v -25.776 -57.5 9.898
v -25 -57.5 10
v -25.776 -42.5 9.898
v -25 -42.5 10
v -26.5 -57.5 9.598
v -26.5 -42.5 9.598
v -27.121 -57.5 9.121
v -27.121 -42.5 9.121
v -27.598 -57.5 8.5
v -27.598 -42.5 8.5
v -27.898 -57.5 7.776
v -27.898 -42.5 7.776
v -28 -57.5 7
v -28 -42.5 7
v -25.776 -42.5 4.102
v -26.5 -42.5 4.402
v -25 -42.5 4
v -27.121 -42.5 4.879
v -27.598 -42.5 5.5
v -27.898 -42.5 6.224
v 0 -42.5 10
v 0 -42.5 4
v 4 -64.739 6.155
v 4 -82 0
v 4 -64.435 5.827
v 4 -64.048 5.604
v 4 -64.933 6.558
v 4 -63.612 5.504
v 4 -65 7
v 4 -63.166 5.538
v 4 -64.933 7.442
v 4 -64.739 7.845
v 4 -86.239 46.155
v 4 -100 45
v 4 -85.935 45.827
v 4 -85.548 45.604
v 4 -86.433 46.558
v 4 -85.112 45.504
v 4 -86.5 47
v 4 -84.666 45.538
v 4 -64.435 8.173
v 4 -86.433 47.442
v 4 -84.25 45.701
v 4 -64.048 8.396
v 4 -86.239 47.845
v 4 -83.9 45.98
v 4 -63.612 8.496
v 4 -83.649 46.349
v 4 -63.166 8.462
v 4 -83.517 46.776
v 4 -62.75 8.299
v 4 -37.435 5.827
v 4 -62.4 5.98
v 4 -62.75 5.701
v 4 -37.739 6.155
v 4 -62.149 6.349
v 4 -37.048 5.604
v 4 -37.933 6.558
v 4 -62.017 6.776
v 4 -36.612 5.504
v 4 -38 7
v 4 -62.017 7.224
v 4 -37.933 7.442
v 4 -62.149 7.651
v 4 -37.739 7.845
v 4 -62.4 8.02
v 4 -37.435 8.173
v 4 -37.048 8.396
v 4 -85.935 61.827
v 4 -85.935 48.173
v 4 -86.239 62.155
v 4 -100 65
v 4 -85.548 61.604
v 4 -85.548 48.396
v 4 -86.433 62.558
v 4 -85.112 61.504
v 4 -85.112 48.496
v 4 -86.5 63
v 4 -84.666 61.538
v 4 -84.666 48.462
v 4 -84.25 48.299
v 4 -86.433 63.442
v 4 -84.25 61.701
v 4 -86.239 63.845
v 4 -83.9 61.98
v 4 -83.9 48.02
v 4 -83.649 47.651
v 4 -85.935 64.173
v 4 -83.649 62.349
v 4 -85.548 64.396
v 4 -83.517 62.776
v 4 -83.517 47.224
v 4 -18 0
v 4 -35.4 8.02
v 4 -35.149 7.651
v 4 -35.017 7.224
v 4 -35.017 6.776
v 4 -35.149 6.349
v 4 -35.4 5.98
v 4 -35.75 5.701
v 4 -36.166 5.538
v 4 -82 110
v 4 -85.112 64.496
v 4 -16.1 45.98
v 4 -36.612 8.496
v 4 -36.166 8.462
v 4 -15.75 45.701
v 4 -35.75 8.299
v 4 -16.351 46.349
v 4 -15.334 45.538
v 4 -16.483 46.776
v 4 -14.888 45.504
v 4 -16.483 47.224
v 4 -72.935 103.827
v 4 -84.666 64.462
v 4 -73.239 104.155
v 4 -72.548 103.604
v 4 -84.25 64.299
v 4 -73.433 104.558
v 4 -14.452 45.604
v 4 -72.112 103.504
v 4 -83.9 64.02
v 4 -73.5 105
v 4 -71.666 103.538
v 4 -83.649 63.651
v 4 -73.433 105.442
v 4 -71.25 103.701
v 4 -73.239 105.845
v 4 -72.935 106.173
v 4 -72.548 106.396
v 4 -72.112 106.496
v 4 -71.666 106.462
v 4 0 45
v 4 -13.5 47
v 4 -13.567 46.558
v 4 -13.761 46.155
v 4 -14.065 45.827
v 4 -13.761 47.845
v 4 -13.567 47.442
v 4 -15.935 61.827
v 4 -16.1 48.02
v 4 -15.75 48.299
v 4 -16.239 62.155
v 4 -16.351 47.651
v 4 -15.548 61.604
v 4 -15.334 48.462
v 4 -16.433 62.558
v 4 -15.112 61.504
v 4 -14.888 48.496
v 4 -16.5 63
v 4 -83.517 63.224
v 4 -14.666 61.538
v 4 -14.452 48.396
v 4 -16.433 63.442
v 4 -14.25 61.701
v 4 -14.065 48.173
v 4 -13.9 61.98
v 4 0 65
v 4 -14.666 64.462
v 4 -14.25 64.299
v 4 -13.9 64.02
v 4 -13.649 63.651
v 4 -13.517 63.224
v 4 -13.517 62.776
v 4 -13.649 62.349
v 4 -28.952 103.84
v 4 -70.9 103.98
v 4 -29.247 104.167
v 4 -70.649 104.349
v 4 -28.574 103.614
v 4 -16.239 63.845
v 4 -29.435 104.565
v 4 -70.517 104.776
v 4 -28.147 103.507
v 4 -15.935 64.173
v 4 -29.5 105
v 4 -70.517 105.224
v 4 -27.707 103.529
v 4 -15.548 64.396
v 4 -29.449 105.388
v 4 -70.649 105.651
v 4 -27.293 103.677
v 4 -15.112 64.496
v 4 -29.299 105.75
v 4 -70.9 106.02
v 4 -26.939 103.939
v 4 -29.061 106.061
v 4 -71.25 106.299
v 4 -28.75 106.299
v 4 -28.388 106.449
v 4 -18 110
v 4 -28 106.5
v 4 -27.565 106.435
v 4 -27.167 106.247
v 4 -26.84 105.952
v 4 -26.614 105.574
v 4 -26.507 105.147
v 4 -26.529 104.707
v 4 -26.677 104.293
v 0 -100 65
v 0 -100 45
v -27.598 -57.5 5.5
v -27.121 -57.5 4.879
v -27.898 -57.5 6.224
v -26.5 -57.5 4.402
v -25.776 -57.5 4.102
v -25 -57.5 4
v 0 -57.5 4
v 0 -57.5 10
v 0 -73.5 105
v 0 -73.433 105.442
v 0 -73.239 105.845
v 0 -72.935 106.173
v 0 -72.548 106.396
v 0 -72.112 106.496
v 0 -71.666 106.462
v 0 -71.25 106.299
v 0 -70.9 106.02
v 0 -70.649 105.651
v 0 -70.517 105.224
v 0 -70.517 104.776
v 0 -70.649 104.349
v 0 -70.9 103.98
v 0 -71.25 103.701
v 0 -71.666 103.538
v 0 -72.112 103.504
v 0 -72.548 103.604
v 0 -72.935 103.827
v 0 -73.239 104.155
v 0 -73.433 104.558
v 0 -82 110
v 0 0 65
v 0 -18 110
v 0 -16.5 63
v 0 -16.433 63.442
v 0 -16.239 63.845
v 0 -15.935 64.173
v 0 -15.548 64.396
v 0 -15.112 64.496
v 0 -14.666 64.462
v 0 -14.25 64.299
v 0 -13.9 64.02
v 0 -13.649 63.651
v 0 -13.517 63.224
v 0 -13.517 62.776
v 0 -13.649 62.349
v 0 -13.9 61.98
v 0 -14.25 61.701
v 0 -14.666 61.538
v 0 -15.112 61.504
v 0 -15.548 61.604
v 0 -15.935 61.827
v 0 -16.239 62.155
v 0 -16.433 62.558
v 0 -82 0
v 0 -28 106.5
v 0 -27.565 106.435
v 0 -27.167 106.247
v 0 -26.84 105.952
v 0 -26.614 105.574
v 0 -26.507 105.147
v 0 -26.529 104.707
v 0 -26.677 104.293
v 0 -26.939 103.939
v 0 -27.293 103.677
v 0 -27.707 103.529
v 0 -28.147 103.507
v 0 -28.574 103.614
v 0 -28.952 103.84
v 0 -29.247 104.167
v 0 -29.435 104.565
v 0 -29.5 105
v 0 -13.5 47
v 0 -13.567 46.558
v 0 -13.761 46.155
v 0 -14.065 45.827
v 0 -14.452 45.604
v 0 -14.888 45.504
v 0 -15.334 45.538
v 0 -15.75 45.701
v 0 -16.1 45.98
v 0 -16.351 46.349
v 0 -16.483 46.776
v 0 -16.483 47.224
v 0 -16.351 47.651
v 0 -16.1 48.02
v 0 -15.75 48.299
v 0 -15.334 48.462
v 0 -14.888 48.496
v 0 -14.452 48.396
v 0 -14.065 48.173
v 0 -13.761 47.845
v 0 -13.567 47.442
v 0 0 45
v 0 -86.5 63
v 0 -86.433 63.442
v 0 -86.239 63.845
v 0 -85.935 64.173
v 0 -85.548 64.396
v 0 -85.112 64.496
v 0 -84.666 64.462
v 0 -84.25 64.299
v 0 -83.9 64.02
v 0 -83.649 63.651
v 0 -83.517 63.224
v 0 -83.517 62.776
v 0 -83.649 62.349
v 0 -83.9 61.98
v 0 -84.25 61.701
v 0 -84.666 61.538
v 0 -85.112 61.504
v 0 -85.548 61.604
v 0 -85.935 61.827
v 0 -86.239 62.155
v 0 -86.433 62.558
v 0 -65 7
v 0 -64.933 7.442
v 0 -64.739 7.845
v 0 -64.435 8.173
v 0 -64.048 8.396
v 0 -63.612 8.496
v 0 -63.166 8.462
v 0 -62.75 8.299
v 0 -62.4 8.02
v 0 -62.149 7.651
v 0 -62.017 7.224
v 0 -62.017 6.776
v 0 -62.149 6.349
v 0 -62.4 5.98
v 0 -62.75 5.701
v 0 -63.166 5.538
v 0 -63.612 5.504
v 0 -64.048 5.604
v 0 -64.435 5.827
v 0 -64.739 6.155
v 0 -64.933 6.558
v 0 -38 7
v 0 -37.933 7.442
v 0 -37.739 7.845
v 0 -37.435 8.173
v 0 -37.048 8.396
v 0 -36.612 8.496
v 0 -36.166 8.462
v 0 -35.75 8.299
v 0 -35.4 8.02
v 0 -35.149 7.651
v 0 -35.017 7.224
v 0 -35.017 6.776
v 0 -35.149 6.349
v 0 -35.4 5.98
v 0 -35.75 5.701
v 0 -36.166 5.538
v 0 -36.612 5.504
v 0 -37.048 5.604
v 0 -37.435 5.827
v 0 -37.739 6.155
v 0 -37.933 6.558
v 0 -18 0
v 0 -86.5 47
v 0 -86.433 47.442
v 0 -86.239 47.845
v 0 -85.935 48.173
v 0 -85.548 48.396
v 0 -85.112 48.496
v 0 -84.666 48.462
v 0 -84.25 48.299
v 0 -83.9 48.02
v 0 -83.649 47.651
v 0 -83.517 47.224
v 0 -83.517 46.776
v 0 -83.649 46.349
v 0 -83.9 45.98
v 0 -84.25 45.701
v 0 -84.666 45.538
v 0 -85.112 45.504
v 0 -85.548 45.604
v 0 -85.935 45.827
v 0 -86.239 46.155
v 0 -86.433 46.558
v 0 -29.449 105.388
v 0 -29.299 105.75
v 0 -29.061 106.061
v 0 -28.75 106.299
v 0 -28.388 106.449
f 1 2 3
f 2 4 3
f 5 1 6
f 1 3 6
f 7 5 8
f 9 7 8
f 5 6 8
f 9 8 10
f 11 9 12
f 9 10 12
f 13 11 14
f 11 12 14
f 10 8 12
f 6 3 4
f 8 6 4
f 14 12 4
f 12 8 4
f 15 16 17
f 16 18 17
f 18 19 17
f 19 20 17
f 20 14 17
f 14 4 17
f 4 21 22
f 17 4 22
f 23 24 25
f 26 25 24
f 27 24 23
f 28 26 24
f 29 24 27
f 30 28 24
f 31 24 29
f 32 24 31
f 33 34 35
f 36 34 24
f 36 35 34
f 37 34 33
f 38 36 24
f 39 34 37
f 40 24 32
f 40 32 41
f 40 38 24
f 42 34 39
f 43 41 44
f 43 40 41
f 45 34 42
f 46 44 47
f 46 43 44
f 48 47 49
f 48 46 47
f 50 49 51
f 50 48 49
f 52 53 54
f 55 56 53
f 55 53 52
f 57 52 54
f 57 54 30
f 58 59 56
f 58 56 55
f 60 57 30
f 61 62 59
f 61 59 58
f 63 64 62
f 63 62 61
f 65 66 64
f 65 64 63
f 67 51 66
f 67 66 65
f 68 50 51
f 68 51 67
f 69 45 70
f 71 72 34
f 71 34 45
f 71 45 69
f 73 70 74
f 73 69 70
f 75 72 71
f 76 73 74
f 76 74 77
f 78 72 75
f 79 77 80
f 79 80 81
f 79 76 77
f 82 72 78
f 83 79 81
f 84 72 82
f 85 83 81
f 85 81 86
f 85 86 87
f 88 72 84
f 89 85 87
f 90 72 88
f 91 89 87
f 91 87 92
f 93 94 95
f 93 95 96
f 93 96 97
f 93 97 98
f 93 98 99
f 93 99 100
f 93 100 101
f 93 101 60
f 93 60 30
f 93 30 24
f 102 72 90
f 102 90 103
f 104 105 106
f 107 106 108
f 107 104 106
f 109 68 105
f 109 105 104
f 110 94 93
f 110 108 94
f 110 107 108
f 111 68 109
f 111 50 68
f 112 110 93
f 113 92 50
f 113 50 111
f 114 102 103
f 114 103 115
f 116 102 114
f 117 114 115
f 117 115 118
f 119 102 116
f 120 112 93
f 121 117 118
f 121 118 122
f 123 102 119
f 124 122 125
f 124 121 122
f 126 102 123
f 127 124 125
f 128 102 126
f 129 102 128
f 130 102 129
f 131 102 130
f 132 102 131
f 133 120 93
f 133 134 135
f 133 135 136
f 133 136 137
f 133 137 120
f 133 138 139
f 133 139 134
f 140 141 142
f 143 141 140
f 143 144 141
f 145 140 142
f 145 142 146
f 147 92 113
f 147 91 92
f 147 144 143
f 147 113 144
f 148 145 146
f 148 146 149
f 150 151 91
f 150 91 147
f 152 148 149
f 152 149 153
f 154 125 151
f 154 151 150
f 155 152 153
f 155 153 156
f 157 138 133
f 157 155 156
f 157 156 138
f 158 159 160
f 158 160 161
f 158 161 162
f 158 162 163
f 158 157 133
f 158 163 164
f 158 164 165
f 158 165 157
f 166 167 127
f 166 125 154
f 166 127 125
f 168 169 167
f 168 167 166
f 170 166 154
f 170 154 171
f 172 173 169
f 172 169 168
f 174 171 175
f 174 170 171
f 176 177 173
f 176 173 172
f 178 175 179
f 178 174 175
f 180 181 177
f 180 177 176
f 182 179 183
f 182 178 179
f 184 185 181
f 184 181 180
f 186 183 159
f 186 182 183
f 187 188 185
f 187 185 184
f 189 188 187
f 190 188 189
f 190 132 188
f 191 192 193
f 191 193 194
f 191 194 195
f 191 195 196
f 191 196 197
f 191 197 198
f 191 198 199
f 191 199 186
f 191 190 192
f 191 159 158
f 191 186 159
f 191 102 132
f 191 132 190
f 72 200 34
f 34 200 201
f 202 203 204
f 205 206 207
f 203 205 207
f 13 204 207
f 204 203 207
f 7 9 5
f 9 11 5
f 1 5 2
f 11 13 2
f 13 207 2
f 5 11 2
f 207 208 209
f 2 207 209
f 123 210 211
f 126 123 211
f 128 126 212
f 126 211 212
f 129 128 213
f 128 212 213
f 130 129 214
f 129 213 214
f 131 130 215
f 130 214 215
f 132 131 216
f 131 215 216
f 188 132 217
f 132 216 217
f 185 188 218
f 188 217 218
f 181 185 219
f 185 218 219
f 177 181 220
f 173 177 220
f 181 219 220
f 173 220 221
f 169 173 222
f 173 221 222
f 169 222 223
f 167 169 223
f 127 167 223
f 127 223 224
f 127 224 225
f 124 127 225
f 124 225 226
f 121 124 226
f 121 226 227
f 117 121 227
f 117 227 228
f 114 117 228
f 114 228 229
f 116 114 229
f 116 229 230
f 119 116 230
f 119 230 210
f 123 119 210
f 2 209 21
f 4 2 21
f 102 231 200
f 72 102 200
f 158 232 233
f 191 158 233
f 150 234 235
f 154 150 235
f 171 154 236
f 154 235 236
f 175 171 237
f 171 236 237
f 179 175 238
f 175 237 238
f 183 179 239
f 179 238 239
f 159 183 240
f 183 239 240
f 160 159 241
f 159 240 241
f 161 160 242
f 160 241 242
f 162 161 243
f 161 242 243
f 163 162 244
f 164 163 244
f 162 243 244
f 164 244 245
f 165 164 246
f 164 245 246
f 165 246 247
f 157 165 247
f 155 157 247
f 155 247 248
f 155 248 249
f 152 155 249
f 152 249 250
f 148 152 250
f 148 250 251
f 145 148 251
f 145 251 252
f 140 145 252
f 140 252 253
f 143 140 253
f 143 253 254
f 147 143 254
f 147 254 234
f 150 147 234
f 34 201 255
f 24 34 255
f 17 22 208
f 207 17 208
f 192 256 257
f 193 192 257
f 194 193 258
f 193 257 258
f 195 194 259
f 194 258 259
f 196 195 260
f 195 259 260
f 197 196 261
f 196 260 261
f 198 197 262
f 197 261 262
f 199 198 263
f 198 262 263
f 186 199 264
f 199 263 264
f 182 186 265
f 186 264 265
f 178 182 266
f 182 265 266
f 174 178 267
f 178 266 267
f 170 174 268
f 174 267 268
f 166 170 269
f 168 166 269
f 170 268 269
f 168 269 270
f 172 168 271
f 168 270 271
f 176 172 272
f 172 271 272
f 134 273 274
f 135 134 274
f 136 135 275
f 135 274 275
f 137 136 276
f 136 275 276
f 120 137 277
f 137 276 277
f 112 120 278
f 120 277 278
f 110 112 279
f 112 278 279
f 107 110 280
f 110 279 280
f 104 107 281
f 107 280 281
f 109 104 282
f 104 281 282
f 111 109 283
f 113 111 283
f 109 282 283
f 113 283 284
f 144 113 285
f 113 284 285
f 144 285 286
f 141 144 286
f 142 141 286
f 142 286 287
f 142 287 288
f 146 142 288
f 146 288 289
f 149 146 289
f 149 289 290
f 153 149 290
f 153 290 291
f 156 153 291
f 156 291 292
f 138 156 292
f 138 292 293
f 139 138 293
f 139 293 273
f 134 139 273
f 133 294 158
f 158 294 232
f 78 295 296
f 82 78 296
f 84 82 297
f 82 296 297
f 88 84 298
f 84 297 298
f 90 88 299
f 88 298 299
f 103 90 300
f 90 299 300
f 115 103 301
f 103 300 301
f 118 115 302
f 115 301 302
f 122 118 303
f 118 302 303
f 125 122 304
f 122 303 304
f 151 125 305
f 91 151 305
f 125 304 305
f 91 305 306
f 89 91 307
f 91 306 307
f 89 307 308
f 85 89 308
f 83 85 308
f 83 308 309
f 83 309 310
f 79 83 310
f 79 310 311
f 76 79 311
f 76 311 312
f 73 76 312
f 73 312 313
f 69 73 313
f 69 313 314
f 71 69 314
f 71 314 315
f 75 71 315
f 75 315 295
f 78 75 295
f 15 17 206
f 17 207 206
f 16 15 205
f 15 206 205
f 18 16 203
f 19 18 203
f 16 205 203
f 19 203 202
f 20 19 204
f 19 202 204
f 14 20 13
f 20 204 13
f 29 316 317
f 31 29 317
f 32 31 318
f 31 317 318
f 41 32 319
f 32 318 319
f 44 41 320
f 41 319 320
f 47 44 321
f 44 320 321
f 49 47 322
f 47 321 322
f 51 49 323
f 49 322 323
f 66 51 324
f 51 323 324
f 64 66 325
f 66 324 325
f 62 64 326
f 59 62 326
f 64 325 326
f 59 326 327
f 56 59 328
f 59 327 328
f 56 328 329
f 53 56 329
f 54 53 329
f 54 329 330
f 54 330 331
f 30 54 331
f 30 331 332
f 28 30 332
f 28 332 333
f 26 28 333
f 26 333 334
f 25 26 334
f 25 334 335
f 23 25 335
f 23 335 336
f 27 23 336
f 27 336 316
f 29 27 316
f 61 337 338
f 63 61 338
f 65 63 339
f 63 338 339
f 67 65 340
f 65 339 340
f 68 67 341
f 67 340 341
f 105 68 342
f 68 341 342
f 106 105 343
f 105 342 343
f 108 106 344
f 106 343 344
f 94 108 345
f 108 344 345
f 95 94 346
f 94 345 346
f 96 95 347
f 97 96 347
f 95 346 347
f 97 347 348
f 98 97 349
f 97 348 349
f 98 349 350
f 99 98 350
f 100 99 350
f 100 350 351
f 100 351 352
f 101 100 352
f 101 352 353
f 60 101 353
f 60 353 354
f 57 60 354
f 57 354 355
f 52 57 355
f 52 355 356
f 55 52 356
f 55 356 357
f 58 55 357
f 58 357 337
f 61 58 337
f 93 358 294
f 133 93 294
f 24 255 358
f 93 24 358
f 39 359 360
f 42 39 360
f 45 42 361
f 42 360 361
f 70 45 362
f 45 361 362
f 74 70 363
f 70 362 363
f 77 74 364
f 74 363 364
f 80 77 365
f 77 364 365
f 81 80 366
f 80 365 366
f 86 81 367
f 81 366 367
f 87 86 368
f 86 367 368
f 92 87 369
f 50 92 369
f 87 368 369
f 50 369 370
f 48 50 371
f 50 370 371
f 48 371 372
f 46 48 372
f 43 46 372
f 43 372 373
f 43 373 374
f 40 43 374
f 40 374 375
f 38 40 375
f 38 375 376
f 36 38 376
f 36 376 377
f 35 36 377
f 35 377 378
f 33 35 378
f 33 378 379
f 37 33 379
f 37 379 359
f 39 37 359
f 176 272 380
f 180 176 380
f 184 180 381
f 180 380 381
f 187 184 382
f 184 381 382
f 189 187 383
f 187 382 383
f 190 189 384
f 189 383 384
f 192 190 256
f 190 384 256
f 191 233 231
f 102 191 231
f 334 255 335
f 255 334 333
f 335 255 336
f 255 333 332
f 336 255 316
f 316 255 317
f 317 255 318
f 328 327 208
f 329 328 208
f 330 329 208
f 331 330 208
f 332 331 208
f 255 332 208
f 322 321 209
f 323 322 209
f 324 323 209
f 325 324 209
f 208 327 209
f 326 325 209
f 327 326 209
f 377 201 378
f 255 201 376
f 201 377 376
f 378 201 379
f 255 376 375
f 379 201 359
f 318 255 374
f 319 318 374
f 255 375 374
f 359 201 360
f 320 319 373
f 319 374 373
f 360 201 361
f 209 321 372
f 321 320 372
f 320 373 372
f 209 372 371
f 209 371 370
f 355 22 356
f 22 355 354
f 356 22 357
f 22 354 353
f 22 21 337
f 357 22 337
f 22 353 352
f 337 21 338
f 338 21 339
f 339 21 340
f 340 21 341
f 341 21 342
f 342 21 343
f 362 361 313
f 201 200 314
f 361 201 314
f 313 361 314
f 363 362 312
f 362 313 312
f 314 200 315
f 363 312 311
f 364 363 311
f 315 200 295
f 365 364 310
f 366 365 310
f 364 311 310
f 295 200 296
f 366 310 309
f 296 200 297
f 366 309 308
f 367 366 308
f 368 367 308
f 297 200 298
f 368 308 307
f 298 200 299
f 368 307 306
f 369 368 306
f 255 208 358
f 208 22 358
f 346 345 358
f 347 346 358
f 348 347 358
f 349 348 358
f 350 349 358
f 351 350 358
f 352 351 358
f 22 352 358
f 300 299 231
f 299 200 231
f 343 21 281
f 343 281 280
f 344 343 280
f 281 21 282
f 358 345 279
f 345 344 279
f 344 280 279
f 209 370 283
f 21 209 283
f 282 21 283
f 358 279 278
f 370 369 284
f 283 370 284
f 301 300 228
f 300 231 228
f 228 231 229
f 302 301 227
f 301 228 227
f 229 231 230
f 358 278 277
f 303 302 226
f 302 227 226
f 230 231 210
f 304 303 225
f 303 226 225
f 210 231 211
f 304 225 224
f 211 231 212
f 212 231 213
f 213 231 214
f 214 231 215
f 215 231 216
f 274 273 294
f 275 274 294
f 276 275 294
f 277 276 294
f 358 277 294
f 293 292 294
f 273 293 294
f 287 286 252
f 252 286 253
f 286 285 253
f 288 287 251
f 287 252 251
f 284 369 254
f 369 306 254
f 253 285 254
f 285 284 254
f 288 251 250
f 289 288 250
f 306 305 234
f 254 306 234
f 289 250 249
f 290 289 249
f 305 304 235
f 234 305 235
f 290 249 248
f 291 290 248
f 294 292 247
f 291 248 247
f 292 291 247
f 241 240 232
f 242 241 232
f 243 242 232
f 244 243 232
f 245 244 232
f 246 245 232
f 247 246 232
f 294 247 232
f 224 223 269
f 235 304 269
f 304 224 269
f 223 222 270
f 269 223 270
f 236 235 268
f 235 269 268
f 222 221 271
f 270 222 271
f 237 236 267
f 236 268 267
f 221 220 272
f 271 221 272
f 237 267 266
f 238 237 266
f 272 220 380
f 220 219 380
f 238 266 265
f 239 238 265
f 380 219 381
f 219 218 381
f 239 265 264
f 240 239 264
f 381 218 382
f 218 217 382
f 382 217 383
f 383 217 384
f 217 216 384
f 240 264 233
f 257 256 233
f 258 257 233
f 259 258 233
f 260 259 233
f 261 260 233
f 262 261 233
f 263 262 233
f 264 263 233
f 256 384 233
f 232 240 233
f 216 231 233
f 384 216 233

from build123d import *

# Parameters (mm, degrees)
F1_DEPTH = 4
F2_W     = 7.5
F2_H     = 6
F3_DEPTH = 28
F4_R     = 2.99999
F2_R     = 1.5
F5_DEPTH = 25


# Not quite as in the source:
# - a fillet or chamfer is up to 0.001 mm smaller than in the source, because OpenCascade refuses the exact size


with BuildPart() as f1:
    # F0 (on Right) → F1 (new body)
    with BuildSketch(Plane.YZ):
        Polygon((-50, 55), (0, 55), (0, 65), (-18, 110), (-50, 110), align=None)
        Polygon((-50, 0), (-18, 0), (0, 45), (0, 55), (-50, 55), align=None)
        Polygon((-100, 55), (-50, 55), (-50, 110), (-82, 110), (-100, 65), align=None)
        Polygon((-82, 0), (-50, 0), (-50, 55), (-100, 55), (-100, 45), align=None)
    extrude(amount=F1_DEPTH)

    # F2 (on face) → F3 (join)
    with BuildSketch(Plane(origin=(0, 0, 0), x_dir=(0, -1, 0), z_dir=(-1, 0, 0))):
        with Locations((53.75, 7)):
            Rectangle(F2_W, F2_H)
        Polygon((42.5, 4), (50, 4), (50, 10), (42.5, 10), (42.5, 7), align=None)
    extrude(amount=F3_DEPTH)

    # F4 (radius 3 in the source; OpenCascade refuses exactly that, so slightly less here)
    f4_edges = [f1.edges().sort_by_distance(p)[0] for p in [
        (-28, -50, 4),
        (-28, -50, 10),
    ]]
    fillet(f4_edges, radius=F4_R)

    # F2 (on face) → F5 (cut)
    with BuildSketch(Plane(origin=(0, 0, 0), x_dir=(0, -1, 0), z_dir=(-1, 0, 0))):
        with Locations((72, 105)):
            Circle(F2_R)
        with Locations((85, 63)):
            Circle(F2_R)
        with Locations((85, 47)):
            Circle(F2_R)
        with Locations((15, 63)):
            Circle(F2_R)
        with BuildLine():
            ThreePointArc((16.5, 47), (15, 48.5), (13.5, 47))
            ThreePointArc((13.5, 47), (15, 45.5), (16.5, 47))
        make_face()
        with BuildLine():
            ThreePointArc((29.5, 105), (29.0606601718, 106.0606601718), (28, 106.5))
            ThreePointArc((28, 106.5), (26.9393398282, 103.9393398282), (29.5, 105))
        make_face()
        with Locations((63.5, 7)):
            Circle(F2_R)
        with Locations((36.5, 7)):
            Circle(F2_R)
    extrude(amount=-F5_DEPTH, mode=Mode.SUBTRACT)


solid = f1.part
